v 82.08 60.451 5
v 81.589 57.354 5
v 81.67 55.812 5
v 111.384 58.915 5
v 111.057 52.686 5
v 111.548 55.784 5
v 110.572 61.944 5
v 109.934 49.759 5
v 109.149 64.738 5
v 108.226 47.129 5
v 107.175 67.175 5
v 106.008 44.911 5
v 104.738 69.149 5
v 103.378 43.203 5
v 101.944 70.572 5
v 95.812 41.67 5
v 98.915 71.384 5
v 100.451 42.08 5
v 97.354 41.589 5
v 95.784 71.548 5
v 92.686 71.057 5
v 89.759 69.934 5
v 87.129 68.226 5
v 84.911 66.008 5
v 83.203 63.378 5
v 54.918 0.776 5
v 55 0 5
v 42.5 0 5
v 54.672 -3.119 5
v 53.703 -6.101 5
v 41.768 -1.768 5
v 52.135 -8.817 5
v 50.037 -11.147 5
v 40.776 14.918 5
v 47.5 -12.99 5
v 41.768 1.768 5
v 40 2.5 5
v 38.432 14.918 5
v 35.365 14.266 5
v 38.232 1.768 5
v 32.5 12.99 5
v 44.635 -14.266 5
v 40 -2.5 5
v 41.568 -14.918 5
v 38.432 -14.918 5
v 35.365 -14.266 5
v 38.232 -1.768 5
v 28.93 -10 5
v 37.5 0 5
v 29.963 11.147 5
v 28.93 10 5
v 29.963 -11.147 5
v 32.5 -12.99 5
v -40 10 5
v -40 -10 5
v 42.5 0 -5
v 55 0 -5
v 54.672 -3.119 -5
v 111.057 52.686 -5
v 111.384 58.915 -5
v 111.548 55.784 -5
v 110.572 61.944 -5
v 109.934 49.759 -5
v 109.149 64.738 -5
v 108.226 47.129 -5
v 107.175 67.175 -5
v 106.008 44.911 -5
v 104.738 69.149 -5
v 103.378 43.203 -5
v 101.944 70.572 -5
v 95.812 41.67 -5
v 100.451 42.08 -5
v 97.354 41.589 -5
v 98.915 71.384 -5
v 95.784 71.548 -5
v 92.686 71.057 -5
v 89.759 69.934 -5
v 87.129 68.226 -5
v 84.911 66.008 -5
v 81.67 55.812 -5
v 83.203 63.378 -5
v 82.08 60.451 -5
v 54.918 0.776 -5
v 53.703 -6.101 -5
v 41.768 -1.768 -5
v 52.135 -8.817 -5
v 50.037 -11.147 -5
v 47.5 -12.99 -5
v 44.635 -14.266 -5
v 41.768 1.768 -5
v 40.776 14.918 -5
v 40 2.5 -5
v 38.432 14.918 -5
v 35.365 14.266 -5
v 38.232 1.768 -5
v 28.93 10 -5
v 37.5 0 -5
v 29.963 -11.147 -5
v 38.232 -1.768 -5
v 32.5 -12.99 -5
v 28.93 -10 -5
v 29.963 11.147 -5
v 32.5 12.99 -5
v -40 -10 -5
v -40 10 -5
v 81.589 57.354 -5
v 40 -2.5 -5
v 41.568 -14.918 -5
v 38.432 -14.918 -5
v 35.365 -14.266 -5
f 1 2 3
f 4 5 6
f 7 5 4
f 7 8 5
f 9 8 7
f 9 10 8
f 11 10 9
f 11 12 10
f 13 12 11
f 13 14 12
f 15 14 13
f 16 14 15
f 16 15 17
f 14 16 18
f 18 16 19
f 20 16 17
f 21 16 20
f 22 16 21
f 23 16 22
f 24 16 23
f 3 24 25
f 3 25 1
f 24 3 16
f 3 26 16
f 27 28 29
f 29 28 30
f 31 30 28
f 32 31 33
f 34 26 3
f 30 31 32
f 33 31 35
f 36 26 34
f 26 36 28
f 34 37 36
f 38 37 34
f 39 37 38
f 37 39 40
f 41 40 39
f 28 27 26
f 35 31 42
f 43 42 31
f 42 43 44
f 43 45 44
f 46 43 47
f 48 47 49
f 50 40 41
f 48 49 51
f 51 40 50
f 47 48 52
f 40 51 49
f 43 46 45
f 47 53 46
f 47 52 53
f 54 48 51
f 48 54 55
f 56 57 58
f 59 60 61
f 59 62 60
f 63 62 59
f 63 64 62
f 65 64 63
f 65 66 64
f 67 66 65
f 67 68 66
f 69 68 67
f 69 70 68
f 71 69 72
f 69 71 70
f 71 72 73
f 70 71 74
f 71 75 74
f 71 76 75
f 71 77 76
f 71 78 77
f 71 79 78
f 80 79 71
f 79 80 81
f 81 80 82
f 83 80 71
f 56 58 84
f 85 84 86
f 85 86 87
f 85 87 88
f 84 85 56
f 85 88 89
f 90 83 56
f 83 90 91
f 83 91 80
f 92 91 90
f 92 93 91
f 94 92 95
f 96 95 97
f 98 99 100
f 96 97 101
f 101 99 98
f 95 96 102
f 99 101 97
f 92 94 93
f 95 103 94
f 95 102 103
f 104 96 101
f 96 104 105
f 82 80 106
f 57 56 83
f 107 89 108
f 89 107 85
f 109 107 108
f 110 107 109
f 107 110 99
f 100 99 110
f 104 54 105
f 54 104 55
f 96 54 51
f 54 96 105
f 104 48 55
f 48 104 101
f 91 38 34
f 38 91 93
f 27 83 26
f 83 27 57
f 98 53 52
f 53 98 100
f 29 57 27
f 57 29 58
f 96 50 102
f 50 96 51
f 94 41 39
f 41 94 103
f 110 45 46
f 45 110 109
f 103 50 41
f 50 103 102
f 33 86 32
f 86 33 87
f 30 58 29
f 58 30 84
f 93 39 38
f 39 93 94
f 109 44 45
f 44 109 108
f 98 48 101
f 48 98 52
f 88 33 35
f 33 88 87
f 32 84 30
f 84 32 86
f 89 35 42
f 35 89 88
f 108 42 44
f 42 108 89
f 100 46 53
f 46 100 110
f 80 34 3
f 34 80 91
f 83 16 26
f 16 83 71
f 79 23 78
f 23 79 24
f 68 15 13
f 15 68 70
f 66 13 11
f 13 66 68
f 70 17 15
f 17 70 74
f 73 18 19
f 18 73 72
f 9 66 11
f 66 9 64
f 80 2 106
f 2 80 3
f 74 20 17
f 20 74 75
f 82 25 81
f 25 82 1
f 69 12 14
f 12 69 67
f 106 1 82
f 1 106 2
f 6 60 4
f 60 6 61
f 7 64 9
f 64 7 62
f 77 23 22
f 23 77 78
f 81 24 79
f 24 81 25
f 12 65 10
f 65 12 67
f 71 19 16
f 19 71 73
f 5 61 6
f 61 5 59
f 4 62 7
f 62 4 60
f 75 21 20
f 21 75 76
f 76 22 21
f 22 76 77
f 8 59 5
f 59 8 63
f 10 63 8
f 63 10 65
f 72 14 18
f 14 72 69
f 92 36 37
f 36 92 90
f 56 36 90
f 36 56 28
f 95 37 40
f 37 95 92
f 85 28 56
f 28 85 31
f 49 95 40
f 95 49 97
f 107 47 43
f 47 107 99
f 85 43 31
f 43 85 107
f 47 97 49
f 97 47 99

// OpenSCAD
// Adjustable Monitor Mount Arm for Insta360
// Designed for custom adjustment and rigid locking.

// --- Parameters ---
arm_length = 80;        // mm
arm_width = 20;         // mm
arm_thickness = 10;     // mm
joint_radius = 15;      // mm
mount_hole_dia = 5;     // mm (for bolt)

// --- Modules ---

module arm_segment() {
    union() {
        // Main body
        cube([arm_length, arm_width, arm_thickness], center=true);
        
        // Pivot joint end
        translate([arm_length/2, 0, 0])
            cylinder(r=joint_radius, h=arm_thickness, center=true);
    }
}

module main_assembly() {
    // Arm 1 (Base to Elbow)
    arm_segment();
    
    // Elbow joint
    translate([arm_length/2, 0, 0])
        rotate([0, 0, 45]) // Adjustable angle
        translate([arm_length/2, 0, 0])
            arm_segment();
}

// --- Execution ---
// Assumptions: Requires M5 bolt and wingnut for friction locking.
// The joint uses a through-hole for variable tightening.
difference() {
    main_assembly();
    
    // Joint mounting holes
    translate([arm_length/2, 0, 0])
        cylinder(d=mount_hole_dia, h=arm_thickness*2, center=true);
}
